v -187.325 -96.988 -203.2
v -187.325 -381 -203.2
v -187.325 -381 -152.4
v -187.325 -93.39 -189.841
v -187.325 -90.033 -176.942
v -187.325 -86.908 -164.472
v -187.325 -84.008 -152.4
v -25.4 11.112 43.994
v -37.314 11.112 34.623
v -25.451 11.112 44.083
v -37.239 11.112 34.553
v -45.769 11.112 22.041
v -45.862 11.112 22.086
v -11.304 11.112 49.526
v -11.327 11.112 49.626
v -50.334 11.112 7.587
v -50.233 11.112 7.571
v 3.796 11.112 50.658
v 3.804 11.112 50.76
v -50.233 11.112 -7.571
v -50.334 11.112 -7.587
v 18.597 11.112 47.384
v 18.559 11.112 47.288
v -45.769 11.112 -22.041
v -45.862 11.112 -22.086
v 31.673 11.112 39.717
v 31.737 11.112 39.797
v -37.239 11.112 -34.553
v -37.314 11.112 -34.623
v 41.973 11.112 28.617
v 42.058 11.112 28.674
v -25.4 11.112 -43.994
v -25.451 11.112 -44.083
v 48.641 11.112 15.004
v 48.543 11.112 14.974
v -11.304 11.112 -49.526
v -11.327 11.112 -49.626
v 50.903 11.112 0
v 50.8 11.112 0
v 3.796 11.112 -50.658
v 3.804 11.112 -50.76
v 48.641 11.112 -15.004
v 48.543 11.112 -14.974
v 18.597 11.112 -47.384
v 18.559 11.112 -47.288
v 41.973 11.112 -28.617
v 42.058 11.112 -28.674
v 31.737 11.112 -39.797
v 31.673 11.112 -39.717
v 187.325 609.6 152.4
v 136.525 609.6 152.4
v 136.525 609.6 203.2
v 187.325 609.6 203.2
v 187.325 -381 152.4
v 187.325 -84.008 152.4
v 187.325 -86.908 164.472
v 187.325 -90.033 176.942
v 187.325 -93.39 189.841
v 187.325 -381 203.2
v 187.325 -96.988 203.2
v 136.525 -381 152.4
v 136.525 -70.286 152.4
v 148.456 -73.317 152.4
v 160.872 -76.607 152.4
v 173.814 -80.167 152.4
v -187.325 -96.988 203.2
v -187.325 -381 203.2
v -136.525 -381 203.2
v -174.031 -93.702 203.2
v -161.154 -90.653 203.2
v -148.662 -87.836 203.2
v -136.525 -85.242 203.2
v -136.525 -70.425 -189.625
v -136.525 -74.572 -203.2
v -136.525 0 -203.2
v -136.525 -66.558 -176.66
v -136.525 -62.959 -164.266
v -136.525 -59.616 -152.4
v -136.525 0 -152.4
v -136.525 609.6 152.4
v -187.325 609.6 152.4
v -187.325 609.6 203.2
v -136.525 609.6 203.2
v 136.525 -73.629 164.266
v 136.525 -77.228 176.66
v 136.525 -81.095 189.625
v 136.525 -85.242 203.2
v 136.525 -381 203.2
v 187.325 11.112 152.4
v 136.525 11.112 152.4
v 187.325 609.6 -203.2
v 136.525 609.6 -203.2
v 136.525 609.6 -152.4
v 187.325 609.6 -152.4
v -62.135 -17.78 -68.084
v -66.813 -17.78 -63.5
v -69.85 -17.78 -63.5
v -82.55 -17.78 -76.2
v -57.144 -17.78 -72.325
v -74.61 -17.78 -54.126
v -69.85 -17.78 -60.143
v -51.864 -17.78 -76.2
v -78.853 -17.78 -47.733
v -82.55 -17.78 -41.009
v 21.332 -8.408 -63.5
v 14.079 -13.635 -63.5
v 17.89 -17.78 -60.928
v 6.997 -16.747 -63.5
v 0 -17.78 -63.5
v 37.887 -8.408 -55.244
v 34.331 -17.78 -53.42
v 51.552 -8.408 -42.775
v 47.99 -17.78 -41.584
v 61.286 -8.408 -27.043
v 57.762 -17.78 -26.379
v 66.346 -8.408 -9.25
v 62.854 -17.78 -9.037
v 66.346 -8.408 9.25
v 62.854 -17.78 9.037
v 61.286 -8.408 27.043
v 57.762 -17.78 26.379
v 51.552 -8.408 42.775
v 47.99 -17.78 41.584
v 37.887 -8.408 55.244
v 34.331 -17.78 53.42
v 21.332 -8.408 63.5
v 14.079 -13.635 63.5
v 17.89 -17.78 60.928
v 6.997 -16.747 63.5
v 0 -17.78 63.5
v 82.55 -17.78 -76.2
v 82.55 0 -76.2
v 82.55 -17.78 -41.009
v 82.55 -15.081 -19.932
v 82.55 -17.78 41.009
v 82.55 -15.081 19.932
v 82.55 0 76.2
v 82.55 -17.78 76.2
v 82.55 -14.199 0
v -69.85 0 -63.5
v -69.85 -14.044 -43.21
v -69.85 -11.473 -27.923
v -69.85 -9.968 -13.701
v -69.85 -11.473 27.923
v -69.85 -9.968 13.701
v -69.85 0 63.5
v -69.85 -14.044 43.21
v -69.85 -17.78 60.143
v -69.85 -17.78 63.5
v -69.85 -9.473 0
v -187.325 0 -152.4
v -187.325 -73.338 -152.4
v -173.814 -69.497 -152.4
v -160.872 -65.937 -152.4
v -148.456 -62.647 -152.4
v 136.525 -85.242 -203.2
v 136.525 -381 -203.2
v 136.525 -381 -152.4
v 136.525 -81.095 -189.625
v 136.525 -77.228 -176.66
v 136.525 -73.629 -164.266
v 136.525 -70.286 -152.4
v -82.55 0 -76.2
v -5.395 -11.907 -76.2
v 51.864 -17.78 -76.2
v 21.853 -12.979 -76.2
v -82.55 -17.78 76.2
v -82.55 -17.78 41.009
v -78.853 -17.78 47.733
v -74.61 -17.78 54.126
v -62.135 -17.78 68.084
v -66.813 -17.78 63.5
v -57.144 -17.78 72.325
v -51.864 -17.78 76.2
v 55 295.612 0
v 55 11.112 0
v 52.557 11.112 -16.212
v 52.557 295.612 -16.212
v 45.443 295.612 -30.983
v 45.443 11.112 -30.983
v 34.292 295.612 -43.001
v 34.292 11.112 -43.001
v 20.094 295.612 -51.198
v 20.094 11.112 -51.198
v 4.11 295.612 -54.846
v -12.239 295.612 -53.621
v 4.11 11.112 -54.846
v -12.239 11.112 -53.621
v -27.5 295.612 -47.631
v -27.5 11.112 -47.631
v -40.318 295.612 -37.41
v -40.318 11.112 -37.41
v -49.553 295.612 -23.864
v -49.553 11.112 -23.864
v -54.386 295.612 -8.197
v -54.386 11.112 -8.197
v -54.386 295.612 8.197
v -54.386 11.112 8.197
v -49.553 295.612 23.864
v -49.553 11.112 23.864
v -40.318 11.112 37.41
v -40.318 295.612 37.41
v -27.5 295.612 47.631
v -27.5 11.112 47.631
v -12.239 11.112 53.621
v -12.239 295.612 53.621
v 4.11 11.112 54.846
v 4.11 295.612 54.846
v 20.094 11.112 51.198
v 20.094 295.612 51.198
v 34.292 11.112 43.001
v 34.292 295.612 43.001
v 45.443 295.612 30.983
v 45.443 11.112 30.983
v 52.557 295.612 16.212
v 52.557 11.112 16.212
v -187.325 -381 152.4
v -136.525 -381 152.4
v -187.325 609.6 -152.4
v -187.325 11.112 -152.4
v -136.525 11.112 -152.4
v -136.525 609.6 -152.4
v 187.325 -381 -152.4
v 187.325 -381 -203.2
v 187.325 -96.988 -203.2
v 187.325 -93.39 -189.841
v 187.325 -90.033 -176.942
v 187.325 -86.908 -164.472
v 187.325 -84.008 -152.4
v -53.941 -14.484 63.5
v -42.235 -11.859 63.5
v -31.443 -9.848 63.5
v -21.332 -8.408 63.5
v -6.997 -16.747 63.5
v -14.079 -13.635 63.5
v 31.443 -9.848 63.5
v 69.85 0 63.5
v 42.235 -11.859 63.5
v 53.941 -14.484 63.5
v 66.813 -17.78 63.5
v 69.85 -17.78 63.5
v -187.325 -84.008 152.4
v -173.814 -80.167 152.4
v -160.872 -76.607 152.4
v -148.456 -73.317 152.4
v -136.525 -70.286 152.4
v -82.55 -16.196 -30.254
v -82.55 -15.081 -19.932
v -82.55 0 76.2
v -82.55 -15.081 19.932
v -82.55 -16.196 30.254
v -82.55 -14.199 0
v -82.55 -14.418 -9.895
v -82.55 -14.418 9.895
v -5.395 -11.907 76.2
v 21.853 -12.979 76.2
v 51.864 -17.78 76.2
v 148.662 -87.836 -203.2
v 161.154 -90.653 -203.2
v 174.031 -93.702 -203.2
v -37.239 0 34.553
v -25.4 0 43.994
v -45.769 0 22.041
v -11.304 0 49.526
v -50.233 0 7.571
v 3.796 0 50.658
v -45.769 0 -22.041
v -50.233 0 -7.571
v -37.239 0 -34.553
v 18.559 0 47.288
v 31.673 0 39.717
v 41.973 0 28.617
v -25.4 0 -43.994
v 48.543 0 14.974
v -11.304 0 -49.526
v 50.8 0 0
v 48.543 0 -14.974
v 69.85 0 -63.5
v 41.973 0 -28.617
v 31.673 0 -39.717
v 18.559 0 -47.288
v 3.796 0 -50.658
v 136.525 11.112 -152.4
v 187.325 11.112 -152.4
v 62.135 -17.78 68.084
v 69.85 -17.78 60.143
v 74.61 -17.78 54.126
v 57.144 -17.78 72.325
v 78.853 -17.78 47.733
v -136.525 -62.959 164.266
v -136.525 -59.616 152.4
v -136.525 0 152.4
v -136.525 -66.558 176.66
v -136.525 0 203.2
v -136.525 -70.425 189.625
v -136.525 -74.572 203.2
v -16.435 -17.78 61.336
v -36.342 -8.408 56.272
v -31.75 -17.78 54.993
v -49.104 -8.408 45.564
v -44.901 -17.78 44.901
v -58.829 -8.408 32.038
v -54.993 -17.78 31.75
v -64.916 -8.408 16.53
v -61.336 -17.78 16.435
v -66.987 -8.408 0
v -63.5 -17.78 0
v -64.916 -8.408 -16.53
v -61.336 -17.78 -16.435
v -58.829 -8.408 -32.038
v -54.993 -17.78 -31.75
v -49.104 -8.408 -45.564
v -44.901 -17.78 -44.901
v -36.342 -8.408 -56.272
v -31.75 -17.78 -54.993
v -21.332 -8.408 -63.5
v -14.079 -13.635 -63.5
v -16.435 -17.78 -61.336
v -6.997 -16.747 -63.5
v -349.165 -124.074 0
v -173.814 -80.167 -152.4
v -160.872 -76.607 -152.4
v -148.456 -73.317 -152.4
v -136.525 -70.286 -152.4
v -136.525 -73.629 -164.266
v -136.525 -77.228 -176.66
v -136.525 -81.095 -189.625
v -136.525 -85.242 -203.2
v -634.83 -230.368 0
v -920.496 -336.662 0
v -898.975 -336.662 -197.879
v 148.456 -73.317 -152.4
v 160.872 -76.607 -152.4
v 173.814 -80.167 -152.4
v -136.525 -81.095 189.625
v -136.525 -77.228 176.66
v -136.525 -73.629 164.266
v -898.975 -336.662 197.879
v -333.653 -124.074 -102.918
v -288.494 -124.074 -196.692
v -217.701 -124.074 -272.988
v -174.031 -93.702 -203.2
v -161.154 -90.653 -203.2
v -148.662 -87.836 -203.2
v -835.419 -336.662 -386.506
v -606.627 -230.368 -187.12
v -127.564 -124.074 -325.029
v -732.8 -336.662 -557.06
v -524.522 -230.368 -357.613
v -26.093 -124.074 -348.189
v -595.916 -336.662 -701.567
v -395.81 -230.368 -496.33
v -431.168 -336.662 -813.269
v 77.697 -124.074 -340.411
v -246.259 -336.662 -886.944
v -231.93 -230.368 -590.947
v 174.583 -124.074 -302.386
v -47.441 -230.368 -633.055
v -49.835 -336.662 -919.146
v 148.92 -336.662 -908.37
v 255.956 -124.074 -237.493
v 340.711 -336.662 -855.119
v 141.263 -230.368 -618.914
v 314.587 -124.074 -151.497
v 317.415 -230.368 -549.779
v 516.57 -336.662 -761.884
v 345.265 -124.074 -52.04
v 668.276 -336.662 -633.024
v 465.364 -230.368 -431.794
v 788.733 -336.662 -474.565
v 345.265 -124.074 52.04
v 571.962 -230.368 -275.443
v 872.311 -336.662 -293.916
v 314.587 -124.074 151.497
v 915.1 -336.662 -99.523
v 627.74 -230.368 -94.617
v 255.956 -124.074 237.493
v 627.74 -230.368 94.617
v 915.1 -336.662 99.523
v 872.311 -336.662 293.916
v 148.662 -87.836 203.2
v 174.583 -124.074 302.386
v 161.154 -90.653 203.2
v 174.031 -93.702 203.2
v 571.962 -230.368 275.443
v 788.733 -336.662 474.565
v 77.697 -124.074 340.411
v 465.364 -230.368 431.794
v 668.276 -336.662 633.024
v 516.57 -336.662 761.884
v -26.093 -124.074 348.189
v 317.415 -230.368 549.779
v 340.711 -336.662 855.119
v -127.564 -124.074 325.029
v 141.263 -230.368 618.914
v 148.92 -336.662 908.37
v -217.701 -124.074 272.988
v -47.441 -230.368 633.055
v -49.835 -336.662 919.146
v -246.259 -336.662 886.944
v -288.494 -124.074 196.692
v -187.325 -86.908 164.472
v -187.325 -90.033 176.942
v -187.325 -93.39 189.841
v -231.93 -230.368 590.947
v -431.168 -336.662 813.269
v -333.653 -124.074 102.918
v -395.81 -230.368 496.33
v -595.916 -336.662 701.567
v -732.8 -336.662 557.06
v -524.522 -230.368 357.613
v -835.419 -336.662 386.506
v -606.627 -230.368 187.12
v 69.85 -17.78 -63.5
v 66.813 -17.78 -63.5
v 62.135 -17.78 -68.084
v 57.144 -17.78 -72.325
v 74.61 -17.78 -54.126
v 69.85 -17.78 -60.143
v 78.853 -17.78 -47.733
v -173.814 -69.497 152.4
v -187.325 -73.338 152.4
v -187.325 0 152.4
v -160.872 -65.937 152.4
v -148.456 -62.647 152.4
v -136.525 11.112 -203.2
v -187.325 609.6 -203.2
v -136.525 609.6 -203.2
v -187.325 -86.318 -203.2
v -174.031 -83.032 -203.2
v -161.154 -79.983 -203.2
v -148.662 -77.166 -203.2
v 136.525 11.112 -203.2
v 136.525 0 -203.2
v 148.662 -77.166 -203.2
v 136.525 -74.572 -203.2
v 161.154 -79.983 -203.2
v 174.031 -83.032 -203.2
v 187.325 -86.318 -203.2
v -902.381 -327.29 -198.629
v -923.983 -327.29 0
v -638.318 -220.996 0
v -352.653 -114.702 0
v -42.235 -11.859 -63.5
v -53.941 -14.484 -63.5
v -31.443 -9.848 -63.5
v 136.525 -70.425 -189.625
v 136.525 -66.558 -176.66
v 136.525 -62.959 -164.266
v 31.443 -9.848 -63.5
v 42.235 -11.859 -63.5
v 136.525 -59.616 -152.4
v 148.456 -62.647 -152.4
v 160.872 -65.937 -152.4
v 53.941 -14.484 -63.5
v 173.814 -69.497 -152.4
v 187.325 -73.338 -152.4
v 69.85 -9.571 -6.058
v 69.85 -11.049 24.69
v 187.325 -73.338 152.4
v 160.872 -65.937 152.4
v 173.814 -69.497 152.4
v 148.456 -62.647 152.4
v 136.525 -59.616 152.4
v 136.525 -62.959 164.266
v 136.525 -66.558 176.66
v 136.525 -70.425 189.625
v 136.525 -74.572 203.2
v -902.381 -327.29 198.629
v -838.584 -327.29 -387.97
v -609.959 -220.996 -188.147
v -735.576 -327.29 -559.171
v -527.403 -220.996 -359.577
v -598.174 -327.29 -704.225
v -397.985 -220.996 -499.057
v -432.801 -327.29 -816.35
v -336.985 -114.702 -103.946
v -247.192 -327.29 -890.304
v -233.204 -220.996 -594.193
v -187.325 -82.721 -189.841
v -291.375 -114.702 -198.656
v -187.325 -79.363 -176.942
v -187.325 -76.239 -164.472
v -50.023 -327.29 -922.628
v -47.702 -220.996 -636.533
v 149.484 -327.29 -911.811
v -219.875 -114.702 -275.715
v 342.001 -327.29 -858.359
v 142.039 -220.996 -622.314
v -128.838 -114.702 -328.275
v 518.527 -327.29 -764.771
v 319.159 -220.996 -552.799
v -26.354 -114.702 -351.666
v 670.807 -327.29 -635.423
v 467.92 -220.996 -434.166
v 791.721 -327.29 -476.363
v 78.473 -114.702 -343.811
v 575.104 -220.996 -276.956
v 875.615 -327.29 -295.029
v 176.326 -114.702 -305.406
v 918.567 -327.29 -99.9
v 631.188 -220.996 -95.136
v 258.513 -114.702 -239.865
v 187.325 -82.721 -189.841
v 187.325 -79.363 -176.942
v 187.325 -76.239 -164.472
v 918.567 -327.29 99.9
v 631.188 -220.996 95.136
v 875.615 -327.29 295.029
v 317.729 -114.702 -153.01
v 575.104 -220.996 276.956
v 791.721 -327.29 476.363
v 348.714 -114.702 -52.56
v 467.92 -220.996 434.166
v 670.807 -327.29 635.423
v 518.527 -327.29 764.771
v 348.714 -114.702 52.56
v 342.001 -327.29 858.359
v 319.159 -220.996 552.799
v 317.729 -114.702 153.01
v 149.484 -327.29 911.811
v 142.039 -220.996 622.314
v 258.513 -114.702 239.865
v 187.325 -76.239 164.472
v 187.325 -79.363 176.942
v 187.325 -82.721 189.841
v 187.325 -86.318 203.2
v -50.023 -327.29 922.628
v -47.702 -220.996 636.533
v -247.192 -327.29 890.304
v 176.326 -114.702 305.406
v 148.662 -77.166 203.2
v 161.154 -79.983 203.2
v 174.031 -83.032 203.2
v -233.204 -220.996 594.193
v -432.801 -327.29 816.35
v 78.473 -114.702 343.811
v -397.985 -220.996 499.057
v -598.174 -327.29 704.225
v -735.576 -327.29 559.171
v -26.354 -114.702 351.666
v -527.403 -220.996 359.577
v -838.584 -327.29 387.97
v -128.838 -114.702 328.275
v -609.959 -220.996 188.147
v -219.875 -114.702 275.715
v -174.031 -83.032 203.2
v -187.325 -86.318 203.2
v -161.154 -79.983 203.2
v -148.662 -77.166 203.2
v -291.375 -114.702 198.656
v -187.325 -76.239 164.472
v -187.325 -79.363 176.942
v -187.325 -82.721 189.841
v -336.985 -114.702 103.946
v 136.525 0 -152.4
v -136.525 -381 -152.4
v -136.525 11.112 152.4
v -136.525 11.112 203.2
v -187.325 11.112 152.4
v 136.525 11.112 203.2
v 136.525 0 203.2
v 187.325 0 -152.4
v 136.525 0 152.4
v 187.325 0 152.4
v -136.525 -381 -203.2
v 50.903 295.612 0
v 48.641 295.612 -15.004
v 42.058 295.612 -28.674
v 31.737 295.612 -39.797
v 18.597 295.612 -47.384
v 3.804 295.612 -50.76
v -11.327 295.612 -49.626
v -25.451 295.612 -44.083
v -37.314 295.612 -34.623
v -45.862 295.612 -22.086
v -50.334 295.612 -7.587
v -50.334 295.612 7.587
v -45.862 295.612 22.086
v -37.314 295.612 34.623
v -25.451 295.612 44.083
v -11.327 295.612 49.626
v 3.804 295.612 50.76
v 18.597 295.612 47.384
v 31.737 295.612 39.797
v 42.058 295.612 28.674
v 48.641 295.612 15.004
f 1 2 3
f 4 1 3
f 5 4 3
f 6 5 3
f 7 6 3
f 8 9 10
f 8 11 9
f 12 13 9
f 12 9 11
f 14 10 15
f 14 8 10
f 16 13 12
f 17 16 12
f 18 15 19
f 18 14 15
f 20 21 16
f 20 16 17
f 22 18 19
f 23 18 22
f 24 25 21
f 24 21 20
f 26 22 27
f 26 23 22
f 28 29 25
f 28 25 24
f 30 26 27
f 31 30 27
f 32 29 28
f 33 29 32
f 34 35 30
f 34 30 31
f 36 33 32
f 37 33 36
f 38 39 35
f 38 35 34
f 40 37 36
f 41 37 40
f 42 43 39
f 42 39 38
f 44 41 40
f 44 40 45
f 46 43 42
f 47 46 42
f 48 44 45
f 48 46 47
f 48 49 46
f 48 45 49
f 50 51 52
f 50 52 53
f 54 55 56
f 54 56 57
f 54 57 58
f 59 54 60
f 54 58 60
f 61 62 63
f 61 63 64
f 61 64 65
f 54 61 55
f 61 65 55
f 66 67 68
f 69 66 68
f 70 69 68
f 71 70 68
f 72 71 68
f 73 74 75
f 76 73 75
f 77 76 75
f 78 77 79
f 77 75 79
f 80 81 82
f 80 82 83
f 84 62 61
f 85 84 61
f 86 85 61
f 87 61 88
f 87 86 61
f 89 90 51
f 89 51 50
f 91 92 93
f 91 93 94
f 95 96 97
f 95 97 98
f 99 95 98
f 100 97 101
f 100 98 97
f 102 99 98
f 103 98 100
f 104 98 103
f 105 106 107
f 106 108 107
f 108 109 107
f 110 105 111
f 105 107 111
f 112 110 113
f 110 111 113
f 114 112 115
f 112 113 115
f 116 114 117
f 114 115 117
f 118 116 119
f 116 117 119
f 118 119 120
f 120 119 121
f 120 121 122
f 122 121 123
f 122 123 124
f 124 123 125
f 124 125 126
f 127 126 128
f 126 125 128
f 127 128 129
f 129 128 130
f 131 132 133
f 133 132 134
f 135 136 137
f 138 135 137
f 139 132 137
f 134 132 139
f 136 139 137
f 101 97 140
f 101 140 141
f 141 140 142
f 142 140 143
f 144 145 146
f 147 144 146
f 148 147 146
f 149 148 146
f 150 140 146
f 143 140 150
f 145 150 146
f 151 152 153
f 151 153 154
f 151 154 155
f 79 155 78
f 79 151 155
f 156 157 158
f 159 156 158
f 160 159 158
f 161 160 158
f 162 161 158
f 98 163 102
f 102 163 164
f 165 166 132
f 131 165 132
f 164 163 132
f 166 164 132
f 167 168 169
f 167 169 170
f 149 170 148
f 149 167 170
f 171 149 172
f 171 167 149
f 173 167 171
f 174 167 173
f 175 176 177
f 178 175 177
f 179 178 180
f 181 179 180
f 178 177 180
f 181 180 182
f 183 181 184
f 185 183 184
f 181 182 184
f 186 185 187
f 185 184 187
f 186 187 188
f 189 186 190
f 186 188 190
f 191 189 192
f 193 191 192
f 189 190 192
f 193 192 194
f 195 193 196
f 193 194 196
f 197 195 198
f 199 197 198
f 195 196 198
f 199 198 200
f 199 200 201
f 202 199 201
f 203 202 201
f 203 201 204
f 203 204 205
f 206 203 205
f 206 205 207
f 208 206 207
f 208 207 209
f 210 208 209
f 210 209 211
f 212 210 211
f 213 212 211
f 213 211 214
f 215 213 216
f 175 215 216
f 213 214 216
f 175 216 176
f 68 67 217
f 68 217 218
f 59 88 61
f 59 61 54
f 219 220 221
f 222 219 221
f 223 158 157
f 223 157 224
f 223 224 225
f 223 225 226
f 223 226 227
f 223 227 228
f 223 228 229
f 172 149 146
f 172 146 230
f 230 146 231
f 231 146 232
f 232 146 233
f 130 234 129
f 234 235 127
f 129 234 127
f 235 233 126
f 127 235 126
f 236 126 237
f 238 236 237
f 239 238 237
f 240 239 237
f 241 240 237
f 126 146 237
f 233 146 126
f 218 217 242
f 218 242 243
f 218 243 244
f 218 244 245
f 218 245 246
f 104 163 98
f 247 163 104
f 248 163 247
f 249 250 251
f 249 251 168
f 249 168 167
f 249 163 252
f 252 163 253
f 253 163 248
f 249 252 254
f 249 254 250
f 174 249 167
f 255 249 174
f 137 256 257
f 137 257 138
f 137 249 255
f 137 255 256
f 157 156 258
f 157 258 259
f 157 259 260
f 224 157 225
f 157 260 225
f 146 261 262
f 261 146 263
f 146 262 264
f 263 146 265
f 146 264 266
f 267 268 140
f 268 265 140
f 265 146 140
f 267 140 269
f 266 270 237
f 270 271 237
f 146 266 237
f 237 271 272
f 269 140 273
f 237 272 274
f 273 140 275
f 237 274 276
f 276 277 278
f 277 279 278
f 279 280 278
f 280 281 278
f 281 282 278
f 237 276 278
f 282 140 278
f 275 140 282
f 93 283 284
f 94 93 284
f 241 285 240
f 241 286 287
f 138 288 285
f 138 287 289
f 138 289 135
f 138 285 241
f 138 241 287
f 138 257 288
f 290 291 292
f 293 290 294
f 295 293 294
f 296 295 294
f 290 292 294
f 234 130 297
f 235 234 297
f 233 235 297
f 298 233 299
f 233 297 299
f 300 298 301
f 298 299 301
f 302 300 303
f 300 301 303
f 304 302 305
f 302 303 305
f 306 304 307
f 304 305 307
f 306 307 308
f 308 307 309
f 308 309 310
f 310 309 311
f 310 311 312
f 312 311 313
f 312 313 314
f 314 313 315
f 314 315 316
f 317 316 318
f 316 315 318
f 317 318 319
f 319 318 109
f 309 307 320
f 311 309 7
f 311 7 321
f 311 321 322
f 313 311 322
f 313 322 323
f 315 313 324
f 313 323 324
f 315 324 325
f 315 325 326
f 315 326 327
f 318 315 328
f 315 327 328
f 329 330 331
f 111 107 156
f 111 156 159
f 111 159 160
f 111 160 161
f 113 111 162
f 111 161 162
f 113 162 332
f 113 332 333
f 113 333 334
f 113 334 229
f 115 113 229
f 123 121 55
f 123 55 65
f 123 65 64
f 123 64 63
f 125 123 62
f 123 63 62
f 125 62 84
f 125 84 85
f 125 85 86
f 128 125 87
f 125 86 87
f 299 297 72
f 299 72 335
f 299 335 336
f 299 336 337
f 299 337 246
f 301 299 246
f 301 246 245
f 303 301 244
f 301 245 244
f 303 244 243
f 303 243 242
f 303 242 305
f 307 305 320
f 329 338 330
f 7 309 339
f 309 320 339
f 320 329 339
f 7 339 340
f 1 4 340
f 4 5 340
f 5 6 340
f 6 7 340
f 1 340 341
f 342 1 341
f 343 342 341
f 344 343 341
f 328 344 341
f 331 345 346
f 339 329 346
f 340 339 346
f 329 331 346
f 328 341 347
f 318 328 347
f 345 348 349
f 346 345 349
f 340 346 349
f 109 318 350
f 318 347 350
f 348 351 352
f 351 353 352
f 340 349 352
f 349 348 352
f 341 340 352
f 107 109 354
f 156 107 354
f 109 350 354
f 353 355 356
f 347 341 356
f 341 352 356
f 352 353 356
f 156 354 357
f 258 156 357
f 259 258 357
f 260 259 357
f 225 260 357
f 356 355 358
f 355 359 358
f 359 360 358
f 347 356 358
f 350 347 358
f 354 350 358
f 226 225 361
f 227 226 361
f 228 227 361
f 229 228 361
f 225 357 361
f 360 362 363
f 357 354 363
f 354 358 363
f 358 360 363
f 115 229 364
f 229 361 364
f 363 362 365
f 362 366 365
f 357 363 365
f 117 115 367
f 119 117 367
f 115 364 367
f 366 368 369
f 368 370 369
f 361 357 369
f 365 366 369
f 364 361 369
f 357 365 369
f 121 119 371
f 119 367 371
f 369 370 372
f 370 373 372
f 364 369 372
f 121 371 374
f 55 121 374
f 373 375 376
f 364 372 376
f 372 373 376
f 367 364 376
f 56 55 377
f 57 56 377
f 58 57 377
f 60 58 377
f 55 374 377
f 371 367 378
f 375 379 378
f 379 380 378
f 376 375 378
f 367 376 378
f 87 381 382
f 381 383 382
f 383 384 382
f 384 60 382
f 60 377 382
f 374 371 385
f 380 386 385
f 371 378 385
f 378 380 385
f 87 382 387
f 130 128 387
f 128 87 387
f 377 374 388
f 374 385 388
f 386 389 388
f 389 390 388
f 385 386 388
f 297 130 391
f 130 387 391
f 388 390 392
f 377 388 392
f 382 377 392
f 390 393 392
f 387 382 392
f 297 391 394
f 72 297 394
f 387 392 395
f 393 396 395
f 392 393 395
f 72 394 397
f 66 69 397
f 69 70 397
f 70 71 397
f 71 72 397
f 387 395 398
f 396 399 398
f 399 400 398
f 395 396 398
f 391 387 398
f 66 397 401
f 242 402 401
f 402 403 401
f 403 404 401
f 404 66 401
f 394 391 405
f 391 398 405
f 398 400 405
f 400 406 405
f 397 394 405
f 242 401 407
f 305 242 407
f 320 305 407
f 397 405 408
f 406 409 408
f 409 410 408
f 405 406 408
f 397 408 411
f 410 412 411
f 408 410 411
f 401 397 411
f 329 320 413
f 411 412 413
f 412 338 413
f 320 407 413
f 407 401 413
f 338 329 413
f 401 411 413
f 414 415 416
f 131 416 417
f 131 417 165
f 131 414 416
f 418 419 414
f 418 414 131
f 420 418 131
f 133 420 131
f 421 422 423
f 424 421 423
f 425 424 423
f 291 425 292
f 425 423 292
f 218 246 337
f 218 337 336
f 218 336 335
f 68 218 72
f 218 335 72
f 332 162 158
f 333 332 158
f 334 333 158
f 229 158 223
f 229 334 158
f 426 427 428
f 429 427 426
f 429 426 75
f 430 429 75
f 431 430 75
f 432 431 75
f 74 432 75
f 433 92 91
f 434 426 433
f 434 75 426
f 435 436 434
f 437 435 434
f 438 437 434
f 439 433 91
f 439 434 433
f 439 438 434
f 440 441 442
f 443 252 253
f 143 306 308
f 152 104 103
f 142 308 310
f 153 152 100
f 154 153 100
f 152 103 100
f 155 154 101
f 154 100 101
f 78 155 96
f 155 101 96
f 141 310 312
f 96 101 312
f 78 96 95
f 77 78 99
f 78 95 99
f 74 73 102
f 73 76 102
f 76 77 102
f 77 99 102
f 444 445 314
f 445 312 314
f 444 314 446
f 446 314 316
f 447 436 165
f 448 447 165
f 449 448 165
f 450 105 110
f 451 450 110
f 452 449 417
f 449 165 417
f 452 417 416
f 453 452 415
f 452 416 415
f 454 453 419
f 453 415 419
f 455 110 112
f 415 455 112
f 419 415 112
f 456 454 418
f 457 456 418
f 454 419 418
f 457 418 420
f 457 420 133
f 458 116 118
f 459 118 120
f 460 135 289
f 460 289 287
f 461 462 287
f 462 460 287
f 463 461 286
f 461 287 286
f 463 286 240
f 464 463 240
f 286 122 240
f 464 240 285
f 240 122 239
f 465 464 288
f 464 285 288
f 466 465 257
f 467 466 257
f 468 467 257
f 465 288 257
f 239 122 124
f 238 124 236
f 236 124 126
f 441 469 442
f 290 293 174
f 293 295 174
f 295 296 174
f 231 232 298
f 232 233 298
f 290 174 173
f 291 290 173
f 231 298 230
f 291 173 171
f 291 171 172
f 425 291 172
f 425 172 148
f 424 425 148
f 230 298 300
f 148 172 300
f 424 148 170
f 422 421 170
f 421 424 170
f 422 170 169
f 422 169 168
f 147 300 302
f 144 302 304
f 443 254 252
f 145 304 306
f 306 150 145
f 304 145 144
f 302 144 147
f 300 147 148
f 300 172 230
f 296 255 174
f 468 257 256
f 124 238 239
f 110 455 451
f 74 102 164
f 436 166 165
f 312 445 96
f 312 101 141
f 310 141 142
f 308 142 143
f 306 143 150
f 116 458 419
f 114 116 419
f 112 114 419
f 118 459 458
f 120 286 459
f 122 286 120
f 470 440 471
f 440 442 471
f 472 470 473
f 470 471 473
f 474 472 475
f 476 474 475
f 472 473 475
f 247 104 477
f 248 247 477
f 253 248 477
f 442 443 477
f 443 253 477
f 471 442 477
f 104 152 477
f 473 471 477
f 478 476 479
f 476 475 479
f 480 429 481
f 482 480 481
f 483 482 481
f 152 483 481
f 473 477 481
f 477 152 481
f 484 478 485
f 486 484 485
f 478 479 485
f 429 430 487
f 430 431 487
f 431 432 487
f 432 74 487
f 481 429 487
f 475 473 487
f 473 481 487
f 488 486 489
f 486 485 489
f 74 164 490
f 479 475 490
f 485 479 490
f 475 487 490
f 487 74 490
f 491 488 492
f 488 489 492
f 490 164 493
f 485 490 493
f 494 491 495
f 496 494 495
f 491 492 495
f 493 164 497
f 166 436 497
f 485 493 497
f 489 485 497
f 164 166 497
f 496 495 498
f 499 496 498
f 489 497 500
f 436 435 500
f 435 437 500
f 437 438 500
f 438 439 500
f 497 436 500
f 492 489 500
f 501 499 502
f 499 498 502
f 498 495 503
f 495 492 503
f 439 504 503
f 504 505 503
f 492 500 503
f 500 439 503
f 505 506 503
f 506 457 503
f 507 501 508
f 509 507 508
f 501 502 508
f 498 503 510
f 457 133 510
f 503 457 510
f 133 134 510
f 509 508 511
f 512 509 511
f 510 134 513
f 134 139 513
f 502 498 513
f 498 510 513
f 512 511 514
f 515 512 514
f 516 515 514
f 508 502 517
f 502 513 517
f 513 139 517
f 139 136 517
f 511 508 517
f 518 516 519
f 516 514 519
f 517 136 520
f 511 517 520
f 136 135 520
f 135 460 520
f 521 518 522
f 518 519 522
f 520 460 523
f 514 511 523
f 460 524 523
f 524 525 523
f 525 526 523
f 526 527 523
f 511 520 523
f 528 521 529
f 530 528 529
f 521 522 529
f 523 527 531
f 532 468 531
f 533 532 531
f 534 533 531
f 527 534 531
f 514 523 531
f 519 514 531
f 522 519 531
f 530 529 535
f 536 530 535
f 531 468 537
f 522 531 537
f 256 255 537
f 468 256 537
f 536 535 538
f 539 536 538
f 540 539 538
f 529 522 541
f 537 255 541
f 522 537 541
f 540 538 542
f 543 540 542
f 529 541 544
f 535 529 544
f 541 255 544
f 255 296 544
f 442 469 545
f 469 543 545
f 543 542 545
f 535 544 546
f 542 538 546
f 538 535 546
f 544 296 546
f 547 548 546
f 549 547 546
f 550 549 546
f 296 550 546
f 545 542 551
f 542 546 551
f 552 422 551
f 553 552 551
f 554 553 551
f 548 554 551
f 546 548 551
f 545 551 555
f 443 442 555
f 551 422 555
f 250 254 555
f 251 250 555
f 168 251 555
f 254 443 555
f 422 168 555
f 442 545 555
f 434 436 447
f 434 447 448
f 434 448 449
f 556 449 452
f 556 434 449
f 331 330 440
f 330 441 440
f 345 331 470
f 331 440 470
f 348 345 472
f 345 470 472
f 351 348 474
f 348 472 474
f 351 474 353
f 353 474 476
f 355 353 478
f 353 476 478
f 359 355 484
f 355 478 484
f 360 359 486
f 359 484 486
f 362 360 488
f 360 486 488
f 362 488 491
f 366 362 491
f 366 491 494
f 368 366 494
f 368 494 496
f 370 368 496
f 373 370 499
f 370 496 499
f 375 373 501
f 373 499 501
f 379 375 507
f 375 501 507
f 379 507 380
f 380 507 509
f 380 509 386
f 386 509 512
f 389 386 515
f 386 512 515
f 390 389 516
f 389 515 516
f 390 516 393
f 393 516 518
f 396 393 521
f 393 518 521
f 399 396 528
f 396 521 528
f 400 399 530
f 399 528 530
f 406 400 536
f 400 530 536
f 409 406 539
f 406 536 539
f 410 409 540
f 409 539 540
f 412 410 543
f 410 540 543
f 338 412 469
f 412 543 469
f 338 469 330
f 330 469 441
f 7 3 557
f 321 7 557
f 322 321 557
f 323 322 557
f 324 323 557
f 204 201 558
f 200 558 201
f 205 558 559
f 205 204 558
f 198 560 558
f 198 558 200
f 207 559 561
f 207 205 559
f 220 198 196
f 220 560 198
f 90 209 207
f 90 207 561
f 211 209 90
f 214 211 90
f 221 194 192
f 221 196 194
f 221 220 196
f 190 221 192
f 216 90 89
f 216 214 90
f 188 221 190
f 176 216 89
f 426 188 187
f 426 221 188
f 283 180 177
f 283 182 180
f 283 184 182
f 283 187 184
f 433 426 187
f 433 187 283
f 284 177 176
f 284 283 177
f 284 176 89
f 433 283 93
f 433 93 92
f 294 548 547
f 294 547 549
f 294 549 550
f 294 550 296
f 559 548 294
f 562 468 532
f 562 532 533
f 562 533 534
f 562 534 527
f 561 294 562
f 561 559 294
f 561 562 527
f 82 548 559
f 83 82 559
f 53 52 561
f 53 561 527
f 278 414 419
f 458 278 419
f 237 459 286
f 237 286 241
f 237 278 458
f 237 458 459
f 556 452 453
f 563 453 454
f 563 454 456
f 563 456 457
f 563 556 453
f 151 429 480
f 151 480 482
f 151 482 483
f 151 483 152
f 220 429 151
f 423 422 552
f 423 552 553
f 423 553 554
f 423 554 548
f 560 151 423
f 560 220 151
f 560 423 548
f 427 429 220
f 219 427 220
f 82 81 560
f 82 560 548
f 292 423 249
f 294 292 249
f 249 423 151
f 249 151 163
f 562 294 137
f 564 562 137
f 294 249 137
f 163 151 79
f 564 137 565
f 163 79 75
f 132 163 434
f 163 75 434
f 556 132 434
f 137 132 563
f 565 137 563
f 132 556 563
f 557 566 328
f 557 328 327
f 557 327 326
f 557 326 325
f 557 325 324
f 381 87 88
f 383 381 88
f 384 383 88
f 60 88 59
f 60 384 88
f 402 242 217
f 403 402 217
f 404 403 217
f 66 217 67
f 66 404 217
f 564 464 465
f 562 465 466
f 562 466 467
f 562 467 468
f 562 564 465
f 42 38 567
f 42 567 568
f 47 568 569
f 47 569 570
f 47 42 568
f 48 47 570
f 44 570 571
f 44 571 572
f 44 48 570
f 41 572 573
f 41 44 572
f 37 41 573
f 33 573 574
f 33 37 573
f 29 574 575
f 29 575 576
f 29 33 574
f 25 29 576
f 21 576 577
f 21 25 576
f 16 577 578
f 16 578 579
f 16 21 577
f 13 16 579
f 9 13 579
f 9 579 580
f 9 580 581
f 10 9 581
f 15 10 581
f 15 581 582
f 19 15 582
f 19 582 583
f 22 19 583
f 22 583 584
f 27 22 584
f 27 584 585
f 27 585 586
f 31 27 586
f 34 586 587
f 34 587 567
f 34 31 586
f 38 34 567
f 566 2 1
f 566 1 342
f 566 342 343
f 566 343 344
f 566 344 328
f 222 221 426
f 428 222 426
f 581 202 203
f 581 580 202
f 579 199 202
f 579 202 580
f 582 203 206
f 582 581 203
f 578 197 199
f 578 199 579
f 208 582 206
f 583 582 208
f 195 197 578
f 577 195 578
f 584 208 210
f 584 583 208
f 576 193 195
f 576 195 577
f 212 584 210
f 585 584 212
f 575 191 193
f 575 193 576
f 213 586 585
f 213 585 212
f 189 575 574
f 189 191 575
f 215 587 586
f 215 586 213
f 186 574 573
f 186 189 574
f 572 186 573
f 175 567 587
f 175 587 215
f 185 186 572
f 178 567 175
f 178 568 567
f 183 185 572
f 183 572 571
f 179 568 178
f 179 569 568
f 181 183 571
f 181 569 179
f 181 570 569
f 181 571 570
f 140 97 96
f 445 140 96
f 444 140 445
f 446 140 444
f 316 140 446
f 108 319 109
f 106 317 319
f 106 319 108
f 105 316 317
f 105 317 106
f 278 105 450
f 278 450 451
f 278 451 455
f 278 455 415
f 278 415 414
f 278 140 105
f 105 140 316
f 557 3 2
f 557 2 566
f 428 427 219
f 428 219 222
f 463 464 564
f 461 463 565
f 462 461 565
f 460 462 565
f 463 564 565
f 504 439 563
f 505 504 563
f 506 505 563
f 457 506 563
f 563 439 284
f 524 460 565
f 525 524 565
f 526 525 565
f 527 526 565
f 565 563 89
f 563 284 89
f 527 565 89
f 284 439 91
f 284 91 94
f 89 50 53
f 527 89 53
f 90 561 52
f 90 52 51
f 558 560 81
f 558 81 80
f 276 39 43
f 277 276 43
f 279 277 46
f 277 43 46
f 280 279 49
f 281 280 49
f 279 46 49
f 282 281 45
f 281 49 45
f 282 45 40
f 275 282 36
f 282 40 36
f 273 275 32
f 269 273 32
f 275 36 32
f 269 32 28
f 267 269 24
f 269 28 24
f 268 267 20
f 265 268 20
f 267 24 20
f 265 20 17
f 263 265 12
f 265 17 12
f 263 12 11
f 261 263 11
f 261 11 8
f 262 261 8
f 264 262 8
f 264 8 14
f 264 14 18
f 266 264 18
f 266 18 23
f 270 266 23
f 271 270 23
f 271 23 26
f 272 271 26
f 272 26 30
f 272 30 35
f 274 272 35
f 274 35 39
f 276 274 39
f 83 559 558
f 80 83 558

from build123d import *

# Parameters (mm, degrees)
BOSS_EXTRUDE2_DEPTH  = 11.1125
SKETCH1_11_W         = 50.8
SKETCH1_11_H         = 50.8
BOSS_EXTRUDE3_DEPTH  = 609.6
SKETCH1_12_W         = 50.8
SKETCH1_12_H         = 50.8
BOSS_EXTRUDE4_DEPTH  = 609.6
SKETCH1_13_W         = 50.8
SKETCH1_13_H         = 50.8
BOSS_EXTRUDE5_DEPTH  = 609.6
SKETCH1_14_W         = 50.8
SKETCH1_14_H         = 50.8
BOSS_EXTRUDE6_DEPTH  = 609.6
SKETCH4_R            = 50.8
CUT_EXTRUDE2_DEPTH   = 12.1125
SKETCH5_W            = 165.1
SKETCH5_H            = 152.4
SKETCH5_W_2          = 139.7
SKETCH5_H_2          = 127
BOSS_EXTRUDE8_DEPTH  = 17.78
SKETCH13_W           = 50.8
SKETCH13_H           = 50.8
BOSS_EXTRUDE9_DEPTH  = 381
SKETCH14_R           = 55
SKETCH14_R_2         = 50.90263009
BOSS_EXTRUDE10_DEPTH = 284.5


with BuildPart() as part:
    # Sketch1 → Boss-Extrude2 (new body)
    with BuildSketch(Plane(origin=(0, 0, 0), x_dir=(1, 0, 0), z_dir=(0, 1, 0))):
        Polygon((-136.525, 152.4), (-187.325, 152.4), (-187.325, -203.2), (187.325, -203.2), (187.325, 203.2), (-136.525, 203.2), align=None)
    extrude(amount=BOSS_EXTRUDE2_DEPTH)

    # Sketch1<11> → Boss-Extrude3 (add)
    with BuildSketch(Plane(origin=(0, 0, 0), x_dir=(1, 0, 0), z_dir=(0, 1, 0))):
        with Locations((-161.925, 177.8)):
            Rectangle(SKETCH1_11_W, SKETCH1_11_H)
    extrude(amount=BOSS_EXTRUDE3_DEPTH)

    # Sketch1<12> → Boss-Extrude4 (add)
    with BuildSketch(Plane(origin=(0, 0, 0), x_dir=(1, 0, 0), z_dir=(0, 1, 0))):
        with Locations((-161.925, -177.8)):
            Rectangle(SKETCH1_12_W, SKETCH1_12_H)
    extrude(amount=BOSS_EXTRUDE4_DEPTH)

    # Sketch1<13> → Boss-Extrude5 (add)
    with BuildSketch(Plane(origin=(0, 0, 0), x_dir=(1, 0, 0), z_dir=(0, 1, 0))):
        with Locations((161.925, 177.8)):
            Rectangle(SKETCH1_13_W, SKETCH1_13_H)
    extrude(amount=BOSS_EXTRUDE5_DEPTH)

    # Sketch1<14> → Boss-Extrude6 (add)
    with BuildSketch(Plane(origin=(0, 0, 0), x_dir=(1, 0, 0), z_dir=(0, 1, 0))):
        with Locations((161.925, -177.8)):
            Rectangle(SKETCH1_14_W, SKETCH1_14_H)
    extrude(amount=BOSS_EXTRUDE6_DEPTH)

    # Sketch4 → Cut-Extrude2 (cut, through all)
    with BuildSketch(Plane(origin=(0, 11.1125, 0), x_dir=(1, 0, 0), z_dir=(0, 1, 0))):
        Circle(SKETCH4_R)
    extrude(amount=-CUT_EXTRUDE2_DEPTH, mode=Mode.SUBTRACT)

    # Sketch5 → Boss-Extrude8 (add)
    with BuildSketch(Plane.XZ):
        Rectangle(SKETCH5_W, SKETCH5_H)
        Rectangle(SKETCH5_W_2, SKETCH5_H_2, mode=Mode.SUBTRACT)
    extrude(amount=BOSS_EXTRUDE8_DEPTH)

    # Sketch12 → Revolve-Thin1 (revolve)
    with BuildSketch(Plane.XY):
        Polygon((-63.5, -17.78), (-920.495660607, -336.662106272), (-923.982997727, -327.289887762), (-66.98733712, -8.407781489), align=None)
    revolve(axis=Axis((0, -17.78, 0), (0, -1, 0)))

    # Sketch13 → Boss-Extrude9 (add)
    with BuildSketch(Plane.XZ):
        with Locations((-161.925, 177.8)):
            Rectangle(SKETCH13_W, SKETCH13_H)
        with Locations((161.925, 177.8)):
            Rectangle(SKETCH13_W, SKETCH13_H)
        with Locations((161.925, -177.8)):
            Rectangle(SKETCH13_W, SKETCH13_H)
        with Locations((-161.925, -177.8)):
            Rectangle(SKETCH13_W, SKETCH13_H)
    extrude(amount=BOSS_EXTRUDE9_DEPTH)

    # Sketch14 → Boss-Extrude10 (add)
    with BuildSketch(Plane(origin=(0, 11.1125, 0), x_dir=(1, 0, 0), z_dir=(0, 1, 0))):
        Circle(SKETCH14_R)
        Circle(SKETCH14_R_2, mode=Mode.SUBTRACT)
    extrude(amount=BOSS_EXTRUDE10_DEPTH)


solid = part.part
